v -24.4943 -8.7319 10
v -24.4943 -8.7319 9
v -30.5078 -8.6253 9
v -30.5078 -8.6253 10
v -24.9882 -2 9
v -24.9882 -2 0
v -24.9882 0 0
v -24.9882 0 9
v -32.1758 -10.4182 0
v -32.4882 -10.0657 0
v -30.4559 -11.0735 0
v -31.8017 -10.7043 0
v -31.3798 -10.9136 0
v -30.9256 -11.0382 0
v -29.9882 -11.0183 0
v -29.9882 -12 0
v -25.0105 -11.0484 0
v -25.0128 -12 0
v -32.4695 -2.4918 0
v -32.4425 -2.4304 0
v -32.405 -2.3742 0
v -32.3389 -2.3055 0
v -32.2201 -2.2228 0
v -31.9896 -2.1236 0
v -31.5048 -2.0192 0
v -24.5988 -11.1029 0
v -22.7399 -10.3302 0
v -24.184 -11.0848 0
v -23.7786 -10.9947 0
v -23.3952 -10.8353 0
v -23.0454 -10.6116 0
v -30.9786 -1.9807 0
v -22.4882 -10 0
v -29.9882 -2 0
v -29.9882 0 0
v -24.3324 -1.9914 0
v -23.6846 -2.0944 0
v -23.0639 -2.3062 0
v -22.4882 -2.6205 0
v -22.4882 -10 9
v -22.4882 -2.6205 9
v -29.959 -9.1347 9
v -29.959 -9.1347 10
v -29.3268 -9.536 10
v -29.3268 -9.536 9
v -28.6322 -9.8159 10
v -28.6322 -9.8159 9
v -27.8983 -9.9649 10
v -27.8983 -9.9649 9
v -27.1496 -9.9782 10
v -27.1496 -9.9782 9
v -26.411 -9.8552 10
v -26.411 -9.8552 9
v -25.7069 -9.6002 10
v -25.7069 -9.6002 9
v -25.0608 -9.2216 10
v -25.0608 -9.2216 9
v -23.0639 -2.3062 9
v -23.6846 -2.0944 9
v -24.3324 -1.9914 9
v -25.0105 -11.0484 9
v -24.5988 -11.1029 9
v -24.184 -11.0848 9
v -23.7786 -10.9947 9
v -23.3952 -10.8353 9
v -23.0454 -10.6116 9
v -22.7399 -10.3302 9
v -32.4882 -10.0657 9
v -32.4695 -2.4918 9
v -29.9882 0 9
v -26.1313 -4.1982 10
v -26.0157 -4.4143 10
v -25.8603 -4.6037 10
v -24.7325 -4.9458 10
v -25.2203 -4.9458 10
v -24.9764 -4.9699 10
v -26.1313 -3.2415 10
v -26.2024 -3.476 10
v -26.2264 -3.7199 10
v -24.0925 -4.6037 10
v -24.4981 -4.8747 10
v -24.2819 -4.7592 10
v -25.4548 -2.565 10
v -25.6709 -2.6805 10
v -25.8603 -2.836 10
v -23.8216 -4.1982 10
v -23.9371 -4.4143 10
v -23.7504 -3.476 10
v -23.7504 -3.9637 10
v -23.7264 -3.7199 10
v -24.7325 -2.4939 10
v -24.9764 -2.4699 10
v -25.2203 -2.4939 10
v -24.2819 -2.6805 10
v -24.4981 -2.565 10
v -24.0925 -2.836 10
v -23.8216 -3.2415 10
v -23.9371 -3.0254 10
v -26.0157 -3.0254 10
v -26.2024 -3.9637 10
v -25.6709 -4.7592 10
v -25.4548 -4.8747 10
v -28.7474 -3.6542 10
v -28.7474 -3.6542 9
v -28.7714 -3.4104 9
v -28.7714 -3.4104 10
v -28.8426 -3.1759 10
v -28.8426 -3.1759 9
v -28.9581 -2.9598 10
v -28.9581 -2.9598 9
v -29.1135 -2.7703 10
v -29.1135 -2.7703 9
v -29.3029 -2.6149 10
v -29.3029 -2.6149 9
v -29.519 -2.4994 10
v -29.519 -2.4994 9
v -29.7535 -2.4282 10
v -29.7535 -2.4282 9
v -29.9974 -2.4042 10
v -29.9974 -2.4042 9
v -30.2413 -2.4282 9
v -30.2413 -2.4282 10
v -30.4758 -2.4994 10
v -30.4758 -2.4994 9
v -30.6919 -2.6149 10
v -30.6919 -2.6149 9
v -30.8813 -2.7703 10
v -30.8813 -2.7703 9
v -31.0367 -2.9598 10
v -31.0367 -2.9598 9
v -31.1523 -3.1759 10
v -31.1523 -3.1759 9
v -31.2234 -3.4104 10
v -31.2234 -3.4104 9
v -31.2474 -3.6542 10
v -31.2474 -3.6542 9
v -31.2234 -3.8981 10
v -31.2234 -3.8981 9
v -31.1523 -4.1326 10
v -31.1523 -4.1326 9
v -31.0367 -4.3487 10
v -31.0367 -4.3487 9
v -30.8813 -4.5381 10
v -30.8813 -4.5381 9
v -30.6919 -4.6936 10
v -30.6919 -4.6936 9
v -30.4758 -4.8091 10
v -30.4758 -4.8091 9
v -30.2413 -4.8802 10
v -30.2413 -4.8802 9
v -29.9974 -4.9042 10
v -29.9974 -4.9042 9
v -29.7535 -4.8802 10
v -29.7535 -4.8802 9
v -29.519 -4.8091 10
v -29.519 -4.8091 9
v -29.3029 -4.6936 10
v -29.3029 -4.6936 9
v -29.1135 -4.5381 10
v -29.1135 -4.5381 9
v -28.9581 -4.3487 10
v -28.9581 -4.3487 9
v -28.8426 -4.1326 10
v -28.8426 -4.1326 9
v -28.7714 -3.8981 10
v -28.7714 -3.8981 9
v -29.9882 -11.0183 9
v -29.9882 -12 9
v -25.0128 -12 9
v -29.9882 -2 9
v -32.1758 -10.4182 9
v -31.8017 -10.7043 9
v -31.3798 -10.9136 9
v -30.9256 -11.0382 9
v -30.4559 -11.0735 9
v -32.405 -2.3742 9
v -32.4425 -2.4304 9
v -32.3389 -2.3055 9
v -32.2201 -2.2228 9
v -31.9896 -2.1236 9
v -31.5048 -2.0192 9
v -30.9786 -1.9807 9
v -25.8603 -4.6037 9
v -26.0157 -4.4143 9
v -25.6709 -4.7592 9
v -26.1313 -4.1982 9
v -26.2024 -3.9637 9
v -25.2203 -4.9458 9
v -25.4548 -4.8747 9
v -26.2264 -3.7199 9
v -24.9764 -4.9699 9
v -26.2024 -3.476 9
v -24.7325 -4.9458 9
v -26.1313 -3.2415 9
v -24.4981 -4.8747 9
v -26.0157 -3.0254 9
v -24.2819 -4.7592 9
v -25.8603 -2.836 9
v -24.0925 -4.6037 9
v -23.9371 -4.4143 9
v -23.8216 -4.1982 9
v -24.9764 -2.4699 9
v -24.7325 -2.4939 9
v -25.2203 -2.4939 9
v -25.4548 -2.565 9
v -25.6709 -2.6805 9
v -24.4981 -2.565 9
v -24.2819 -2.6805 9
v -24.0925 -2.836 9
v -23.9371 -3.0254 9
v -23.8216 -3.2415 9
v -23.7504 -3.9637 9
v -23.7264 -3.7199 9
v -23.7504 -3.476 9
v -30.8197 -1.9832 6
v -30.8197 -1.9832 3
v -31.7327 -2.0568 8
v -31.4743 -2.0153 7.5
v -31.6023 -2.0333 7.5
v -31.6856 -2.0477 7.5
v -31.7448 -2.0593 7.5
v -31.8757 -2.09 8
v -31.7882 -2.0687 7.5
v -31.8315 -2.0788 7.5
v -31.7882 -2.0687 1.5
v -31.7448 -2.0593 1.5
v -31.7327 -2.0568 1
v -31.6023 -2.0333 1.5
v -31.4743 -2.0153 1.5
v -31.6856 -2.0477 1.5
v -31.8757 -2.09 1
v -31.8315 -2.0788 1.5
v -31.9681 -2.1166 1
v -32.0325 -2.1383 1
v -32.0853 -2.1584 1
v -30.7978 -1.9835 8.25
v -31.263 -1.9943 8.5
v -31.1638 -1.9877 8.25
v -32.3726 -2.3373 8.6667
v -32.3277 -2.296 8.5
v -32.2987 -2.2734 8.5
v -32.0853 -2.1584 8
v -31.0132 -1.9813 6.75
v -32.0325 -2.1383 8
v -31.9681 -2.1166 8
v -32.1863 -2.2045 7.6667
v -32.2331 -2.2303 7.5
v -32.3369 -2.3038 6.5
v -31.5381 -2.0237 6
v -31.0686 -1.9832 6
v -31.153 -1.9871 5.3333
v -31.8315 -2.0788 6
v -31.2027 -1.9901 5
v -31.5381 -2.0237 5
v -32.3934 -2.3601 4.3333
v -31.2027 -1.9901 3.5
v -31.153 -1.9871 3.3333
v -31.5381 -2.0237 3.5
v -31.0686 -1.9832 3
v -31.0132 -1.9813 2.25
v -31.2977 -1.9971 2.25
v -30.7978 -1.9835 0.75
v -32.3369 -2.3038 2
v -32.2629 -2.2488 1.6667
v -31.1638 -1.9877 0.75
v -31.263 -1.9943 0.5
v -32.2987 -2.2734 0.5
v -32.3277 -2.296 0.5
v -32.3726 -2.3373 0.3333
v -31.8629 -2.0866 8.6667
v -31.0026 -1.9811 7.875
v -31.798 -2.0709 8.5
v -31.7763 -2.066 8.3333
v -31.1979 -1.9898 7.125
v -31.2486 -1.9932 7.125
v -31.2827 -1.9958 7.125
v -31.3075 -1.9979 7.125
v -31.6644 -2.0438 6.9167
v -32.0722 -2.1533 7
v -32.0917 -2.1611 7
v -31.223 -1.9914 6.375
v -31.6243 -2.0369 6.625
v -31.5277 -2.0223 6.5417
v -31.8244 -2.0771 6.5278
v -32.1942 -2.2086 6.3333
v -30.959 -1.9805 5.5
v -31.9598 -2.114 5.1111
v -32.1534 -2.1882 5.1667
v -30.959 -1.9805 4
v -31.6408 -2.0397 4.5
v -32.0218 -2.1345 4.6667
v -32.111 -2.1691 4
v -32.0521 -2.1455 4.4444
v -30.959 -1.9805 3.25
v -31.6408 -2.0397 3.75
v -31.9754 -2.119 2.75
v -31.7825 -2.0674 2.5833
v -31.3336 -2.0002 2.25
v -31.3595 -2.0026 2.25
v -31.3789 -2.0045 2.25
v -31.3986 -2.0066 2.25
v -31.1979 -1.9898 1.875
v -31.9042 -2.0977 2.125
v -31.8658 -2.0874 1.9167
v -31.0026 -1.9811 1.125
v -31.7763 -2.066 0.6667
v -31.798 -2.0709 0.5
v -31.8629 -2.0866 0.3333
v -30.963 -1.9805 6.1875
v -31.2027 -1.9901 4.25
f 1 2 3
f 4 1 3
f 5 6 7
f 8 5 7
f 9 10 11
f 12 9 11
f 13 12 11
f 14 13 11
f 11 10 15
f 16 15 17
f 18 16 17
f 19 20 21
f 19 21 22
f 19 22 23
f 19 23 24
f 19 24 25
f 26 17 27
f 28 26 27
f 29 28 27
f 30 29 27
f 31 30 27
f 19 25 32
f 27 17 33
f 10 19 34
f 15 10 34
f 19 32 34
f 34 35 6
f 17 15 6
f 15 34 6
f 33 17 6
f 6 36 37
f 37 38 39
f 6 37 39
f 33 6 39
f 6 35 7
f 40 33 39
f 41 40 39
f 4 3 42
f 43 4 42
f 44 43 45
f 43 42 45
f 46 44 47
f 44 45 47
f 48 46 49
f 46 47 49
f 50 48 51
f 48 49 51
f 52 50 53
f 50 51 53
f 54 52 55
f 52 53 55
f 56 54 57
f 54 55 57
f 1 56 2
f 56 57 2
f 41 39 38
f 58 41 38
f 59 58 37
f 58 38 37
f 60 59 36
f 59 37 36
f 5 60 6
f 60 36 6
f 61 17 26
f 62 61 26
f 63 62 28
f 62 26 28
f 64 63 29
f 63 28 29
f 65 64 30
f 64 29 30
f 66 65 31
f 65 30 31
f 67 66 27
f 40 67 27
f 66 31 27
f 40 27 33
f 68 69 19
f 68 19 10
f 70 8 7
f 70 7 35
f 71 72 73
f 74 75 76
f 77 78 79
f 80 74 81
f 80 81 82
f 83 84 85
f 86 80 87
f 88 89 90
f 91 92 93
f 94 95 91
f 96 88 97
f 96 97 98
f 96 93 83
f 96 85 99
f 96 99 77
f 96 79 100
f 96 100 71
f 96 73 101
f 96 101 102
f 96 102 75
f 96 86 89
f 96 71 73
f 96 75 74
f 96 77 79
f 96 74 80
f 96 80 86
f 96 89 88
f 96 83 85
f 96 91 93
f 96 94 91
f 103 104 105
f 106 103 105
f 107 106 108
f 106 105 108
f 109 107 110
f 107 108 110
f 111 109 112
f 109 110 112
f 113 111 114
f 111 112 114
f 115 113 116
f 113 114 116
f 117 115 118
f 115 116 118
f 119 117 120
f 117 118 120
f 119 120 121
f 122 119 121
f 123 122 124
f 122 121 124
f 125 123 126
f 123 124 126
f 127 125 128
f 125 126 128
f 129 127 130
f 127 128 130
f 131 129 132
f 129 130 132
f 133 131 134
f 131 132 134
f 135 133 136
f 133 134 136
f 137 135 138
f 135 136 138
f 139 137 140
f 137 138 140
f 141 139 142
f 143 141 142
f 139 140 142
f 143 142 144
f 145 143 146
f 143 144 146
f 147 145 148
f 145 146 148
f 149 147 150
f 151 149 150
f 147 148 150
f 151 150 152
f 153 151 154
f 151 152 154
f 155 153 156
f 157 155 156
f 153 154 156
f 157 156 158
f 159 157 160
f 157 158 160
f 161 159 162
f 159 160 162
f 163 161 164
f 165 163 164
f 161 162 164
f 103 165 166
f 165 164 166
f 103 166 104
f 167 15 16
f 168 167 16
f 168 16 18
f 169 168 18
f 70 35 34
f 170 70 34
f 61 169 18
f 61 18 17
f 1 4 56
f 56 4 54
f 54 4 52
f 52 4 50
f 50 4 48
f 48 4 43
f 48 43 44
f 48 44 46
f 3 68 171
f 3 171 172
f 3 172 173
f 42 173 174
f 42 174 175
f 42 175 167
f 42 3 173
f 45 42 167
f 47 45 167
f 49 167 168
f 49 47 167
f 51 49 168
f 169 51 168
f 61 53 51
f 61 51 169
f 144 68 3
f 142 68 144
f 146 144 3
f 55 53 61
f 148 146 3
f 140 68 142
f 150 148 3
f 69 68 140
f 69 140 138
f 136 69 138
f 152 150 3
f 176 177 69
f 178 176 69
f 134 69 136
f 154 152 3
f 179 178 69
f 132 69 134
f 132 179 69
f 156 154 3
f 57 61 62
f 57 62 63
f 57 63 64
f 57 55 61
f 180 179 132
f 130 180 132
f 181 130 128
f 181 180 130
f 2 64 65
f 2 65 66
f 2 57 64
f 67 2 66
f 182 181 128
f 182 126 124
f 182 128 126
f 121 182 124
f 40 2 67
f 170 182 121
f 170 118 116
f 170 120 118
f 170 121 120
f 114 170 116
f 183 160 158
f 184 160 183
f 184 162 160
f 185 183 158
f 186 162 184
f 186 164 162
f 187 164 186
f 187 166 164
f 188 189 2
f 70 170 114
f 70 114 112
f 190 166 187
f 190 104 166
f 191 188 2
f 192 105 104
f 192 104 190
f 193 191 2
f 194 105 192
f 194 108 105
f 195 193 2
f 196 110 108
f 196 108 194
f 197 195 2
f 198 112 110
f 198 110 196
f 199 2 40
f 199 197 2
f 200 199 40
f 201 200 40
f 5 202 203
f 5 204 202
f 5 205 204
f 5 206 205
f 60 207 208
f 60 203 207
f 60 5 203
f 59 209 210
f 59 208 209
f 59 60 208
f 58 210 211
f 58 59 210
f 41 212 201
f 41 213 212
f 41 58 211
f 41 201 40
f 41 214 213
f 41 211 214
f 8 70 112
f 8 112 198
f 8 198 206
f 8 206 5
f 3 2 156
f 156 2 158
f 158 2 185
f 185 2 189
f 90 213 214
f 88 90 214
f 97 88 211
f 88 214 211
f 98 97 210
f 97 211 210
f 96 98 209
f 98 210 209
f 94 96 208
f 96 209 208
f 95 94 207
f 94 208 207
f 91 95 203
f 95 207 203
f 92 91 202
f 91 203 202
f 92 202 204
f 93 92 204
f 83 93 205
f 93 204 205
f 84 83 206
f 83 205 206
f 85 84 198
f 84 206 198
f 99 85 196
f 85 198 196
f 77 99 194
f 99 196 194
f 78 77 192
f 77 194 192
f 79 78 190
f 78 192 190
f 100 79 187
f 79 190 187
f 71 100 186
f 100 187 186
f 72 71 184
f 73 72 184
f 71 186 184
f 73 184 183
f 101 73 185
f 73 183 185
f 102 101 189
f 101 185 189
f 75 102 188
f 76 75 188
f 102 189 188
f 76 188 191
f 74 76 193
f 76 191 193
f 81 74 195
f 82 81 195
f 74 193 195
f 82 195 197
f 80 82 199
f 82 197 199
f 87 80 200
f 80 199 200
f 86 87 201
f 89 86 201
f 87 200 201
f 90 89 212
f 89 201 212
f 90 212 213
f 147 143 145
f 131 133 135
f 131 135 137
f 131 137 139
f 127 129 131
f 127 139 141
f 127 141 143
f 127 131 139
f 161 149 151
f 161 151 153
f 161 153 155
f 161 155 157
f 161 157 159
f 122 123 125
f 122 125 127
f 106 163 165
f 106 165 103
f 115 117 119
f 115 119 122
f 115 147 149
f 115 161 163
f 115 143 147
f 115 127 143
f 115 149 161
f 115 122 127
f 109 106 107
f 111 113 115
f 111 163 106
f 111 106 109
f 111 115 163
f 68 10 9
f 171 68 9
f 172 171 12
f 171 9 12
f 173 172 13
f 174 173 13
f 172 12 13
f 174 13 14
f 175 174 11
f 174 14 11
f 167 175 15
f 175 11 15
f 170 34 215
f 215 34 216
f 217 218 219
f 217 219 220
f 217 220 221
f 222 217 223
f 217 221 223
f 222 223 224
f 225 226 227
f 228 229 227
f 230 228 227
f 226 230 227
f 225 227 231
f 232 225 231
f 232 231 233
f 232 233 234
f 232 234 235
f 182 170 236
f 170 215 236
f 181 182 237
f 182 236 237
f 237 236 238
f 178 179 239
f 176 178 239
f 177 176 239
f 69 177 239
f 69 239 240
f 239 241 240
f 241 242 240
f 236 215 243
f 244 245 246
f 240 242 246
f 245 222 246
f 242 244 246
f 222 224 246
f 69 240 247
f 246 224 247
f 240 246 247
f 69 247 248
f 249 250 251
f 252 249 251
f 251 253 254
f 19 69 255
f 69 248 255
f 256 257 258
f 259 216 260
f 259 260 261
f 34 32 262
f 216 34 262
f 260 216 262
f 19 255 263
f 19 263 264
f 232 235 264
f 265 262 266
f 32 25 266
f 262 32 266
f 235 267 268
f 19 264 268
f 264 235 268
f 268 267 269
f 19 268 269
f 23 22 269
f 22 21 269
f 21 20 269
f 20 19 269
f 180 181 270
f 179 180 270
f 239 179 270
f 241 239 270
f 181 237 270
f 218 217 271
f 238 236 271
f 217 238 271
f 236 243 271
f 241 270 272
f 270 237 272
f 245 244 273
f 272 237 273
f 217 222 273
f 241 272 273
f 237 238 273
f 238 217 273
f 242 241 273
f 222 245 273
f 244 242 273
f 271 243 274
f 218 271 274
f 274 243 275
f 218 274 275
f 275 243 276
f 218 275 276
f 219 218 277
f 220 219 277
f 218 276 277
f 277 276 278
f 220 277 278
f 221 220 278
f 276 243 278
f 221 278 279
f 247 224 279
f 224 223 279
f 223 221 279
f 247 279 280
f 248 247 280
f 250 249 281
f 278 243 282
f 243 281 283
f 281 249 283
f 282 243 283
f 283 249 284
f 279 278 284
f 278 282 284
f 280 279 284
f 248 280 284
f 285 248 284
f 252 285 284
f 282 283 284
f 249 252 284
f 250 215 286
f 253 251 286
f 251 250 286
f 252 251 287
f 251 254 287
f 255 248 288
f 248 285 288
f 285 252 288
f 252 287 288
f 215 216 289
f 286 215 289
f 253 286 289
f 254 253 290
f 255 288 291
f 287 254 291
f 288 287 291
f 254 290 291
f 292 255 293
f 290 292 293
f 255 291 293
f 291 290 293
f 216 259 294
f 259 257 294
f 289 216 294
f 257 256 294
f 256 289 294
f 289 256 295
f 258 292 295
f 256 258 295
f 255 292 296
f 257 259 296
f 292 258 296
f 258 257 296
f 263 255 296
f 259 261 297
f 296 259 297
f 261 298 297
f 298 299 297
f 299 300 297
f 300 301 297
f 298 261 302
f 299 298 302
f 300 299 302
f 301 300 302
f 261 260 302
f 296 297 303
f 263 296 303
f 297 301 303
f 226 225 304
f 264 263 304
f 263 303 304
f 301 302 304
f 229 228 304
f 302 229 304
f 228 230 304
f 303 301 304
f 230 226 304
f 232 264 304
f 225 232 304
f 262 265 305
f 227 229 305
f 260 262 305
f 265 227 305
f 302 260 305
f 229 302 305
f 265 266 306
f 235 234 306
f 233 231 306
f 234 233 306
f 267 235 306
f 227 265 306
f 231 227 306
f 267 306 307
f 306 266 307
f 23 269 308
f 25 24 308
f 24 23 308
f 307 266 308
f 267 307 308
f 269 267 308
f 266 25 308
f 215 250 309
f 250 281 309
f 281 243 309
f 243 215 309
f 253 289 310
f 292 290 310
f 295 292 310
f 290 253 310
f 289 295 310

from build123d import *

# Parameters (mm, degrees)
F1_DEPTH = 9
F2_R     = 1.25
F3_DEPTH = 1
F4_R     = 0.625
F5_R     = 0.625
F6_DEPTH = 1


with BuildPart() as f1:
    # F0 (on Top) → F1 (new body)
    with BuildSketch(Plane.XY):
        with BuildLine():
            Line((-24.9881935865, -2), (-29.9881935865, -2))
            add(Edge.make_bspline(
                [(-29.9881935865, -2), (-30.1957792579, -1.9806863621), (-30.8858297438, -1.9886899929), (-30.9737131442, -1.9691203625), (-32.3240056363, -2.0563246792), (-32.4695344233, -2.4918309621)],
                knots=[0, 0, 0, 0, 0.3435850183, 0.5315375028, 0.9674384772, 0.9674384772, 0.9674384772, 0.9674384772], degree=3))
            Line((-32.4695344233, -2.4918309621), (-32.4881935865, -10.0656754612))
            ThreePointArc((-32.4881935865, -10.0656754612), (-31.3797872361, -10.9135774988), (-29.9881935865, -11.0183134402))
            Line((-29.9881935865, -11.0183134402), (-25.0104854877, -11.0483904604))
            ThreePointArc((-25.0104854877, -11.0483904604), (-23.5833955913, -10.9234349089), (-22.4881935865, -10))
            Line((-22.4881935865, -10), (-22.4881935865, -2.6204695865))
            ThreePointArc((-22.4881935865, -2.6204695865), (-23.6846353493, -2.0944376038), (-24.9881935865, -2))
        make_face()
        Polygon((-27.4881935865, 0), (-29.9881935865, 0), (-29.9881935865, -2), (-24.9881935865, -2), (-24.9881935865, 0), align=None)
        Polygon((-25.0104854877, -11.0483904604), (-29.9881935865, -11.0183134402), (-29.9881935865, -12), (-27.4881935865, -12), (-25.0128299031, -12), align=None)
    extrude(amount=F1_DEPTH)

    # F2 (on face) → F3 (join)
    with BuildSketch(Plane.XY.offset(9)):
        with Locations((-29.9974028021, -3.6542222369)):
            Circle(F2_R)
        with Locations((-24.9764043838, -3.7198562641)):
            Circle(F2_R)
        with BuildLine():
            Line((-24.4942996651, -8.7319174781), (-30.507825315, -8.6252950132))
            ThreePointArc((-30.507825315, -8.6252950132), (-27.5242896541, -9.9886223537), (-24.4942996651, -8.7319174781))
        make_face()
    extrude(amount=F3_DEPTH)

    # F4 (on face) + F5 (on face) → F6 (cut)
    with BuildSketch(Plane.XY.offset(10)):
        with Locations((-29.9974028021, -3.6542222369)):
            Circle(F4_R)
    with BuildSketch(Plane.XY.offset(10)):
        with Locations((-24.9764043838, -3.7198562641)):
            Circle(F5_R)
    extrude(amount=F6_DEPTH, mode=Mode.SUBTRACT)


solid = f1.part
